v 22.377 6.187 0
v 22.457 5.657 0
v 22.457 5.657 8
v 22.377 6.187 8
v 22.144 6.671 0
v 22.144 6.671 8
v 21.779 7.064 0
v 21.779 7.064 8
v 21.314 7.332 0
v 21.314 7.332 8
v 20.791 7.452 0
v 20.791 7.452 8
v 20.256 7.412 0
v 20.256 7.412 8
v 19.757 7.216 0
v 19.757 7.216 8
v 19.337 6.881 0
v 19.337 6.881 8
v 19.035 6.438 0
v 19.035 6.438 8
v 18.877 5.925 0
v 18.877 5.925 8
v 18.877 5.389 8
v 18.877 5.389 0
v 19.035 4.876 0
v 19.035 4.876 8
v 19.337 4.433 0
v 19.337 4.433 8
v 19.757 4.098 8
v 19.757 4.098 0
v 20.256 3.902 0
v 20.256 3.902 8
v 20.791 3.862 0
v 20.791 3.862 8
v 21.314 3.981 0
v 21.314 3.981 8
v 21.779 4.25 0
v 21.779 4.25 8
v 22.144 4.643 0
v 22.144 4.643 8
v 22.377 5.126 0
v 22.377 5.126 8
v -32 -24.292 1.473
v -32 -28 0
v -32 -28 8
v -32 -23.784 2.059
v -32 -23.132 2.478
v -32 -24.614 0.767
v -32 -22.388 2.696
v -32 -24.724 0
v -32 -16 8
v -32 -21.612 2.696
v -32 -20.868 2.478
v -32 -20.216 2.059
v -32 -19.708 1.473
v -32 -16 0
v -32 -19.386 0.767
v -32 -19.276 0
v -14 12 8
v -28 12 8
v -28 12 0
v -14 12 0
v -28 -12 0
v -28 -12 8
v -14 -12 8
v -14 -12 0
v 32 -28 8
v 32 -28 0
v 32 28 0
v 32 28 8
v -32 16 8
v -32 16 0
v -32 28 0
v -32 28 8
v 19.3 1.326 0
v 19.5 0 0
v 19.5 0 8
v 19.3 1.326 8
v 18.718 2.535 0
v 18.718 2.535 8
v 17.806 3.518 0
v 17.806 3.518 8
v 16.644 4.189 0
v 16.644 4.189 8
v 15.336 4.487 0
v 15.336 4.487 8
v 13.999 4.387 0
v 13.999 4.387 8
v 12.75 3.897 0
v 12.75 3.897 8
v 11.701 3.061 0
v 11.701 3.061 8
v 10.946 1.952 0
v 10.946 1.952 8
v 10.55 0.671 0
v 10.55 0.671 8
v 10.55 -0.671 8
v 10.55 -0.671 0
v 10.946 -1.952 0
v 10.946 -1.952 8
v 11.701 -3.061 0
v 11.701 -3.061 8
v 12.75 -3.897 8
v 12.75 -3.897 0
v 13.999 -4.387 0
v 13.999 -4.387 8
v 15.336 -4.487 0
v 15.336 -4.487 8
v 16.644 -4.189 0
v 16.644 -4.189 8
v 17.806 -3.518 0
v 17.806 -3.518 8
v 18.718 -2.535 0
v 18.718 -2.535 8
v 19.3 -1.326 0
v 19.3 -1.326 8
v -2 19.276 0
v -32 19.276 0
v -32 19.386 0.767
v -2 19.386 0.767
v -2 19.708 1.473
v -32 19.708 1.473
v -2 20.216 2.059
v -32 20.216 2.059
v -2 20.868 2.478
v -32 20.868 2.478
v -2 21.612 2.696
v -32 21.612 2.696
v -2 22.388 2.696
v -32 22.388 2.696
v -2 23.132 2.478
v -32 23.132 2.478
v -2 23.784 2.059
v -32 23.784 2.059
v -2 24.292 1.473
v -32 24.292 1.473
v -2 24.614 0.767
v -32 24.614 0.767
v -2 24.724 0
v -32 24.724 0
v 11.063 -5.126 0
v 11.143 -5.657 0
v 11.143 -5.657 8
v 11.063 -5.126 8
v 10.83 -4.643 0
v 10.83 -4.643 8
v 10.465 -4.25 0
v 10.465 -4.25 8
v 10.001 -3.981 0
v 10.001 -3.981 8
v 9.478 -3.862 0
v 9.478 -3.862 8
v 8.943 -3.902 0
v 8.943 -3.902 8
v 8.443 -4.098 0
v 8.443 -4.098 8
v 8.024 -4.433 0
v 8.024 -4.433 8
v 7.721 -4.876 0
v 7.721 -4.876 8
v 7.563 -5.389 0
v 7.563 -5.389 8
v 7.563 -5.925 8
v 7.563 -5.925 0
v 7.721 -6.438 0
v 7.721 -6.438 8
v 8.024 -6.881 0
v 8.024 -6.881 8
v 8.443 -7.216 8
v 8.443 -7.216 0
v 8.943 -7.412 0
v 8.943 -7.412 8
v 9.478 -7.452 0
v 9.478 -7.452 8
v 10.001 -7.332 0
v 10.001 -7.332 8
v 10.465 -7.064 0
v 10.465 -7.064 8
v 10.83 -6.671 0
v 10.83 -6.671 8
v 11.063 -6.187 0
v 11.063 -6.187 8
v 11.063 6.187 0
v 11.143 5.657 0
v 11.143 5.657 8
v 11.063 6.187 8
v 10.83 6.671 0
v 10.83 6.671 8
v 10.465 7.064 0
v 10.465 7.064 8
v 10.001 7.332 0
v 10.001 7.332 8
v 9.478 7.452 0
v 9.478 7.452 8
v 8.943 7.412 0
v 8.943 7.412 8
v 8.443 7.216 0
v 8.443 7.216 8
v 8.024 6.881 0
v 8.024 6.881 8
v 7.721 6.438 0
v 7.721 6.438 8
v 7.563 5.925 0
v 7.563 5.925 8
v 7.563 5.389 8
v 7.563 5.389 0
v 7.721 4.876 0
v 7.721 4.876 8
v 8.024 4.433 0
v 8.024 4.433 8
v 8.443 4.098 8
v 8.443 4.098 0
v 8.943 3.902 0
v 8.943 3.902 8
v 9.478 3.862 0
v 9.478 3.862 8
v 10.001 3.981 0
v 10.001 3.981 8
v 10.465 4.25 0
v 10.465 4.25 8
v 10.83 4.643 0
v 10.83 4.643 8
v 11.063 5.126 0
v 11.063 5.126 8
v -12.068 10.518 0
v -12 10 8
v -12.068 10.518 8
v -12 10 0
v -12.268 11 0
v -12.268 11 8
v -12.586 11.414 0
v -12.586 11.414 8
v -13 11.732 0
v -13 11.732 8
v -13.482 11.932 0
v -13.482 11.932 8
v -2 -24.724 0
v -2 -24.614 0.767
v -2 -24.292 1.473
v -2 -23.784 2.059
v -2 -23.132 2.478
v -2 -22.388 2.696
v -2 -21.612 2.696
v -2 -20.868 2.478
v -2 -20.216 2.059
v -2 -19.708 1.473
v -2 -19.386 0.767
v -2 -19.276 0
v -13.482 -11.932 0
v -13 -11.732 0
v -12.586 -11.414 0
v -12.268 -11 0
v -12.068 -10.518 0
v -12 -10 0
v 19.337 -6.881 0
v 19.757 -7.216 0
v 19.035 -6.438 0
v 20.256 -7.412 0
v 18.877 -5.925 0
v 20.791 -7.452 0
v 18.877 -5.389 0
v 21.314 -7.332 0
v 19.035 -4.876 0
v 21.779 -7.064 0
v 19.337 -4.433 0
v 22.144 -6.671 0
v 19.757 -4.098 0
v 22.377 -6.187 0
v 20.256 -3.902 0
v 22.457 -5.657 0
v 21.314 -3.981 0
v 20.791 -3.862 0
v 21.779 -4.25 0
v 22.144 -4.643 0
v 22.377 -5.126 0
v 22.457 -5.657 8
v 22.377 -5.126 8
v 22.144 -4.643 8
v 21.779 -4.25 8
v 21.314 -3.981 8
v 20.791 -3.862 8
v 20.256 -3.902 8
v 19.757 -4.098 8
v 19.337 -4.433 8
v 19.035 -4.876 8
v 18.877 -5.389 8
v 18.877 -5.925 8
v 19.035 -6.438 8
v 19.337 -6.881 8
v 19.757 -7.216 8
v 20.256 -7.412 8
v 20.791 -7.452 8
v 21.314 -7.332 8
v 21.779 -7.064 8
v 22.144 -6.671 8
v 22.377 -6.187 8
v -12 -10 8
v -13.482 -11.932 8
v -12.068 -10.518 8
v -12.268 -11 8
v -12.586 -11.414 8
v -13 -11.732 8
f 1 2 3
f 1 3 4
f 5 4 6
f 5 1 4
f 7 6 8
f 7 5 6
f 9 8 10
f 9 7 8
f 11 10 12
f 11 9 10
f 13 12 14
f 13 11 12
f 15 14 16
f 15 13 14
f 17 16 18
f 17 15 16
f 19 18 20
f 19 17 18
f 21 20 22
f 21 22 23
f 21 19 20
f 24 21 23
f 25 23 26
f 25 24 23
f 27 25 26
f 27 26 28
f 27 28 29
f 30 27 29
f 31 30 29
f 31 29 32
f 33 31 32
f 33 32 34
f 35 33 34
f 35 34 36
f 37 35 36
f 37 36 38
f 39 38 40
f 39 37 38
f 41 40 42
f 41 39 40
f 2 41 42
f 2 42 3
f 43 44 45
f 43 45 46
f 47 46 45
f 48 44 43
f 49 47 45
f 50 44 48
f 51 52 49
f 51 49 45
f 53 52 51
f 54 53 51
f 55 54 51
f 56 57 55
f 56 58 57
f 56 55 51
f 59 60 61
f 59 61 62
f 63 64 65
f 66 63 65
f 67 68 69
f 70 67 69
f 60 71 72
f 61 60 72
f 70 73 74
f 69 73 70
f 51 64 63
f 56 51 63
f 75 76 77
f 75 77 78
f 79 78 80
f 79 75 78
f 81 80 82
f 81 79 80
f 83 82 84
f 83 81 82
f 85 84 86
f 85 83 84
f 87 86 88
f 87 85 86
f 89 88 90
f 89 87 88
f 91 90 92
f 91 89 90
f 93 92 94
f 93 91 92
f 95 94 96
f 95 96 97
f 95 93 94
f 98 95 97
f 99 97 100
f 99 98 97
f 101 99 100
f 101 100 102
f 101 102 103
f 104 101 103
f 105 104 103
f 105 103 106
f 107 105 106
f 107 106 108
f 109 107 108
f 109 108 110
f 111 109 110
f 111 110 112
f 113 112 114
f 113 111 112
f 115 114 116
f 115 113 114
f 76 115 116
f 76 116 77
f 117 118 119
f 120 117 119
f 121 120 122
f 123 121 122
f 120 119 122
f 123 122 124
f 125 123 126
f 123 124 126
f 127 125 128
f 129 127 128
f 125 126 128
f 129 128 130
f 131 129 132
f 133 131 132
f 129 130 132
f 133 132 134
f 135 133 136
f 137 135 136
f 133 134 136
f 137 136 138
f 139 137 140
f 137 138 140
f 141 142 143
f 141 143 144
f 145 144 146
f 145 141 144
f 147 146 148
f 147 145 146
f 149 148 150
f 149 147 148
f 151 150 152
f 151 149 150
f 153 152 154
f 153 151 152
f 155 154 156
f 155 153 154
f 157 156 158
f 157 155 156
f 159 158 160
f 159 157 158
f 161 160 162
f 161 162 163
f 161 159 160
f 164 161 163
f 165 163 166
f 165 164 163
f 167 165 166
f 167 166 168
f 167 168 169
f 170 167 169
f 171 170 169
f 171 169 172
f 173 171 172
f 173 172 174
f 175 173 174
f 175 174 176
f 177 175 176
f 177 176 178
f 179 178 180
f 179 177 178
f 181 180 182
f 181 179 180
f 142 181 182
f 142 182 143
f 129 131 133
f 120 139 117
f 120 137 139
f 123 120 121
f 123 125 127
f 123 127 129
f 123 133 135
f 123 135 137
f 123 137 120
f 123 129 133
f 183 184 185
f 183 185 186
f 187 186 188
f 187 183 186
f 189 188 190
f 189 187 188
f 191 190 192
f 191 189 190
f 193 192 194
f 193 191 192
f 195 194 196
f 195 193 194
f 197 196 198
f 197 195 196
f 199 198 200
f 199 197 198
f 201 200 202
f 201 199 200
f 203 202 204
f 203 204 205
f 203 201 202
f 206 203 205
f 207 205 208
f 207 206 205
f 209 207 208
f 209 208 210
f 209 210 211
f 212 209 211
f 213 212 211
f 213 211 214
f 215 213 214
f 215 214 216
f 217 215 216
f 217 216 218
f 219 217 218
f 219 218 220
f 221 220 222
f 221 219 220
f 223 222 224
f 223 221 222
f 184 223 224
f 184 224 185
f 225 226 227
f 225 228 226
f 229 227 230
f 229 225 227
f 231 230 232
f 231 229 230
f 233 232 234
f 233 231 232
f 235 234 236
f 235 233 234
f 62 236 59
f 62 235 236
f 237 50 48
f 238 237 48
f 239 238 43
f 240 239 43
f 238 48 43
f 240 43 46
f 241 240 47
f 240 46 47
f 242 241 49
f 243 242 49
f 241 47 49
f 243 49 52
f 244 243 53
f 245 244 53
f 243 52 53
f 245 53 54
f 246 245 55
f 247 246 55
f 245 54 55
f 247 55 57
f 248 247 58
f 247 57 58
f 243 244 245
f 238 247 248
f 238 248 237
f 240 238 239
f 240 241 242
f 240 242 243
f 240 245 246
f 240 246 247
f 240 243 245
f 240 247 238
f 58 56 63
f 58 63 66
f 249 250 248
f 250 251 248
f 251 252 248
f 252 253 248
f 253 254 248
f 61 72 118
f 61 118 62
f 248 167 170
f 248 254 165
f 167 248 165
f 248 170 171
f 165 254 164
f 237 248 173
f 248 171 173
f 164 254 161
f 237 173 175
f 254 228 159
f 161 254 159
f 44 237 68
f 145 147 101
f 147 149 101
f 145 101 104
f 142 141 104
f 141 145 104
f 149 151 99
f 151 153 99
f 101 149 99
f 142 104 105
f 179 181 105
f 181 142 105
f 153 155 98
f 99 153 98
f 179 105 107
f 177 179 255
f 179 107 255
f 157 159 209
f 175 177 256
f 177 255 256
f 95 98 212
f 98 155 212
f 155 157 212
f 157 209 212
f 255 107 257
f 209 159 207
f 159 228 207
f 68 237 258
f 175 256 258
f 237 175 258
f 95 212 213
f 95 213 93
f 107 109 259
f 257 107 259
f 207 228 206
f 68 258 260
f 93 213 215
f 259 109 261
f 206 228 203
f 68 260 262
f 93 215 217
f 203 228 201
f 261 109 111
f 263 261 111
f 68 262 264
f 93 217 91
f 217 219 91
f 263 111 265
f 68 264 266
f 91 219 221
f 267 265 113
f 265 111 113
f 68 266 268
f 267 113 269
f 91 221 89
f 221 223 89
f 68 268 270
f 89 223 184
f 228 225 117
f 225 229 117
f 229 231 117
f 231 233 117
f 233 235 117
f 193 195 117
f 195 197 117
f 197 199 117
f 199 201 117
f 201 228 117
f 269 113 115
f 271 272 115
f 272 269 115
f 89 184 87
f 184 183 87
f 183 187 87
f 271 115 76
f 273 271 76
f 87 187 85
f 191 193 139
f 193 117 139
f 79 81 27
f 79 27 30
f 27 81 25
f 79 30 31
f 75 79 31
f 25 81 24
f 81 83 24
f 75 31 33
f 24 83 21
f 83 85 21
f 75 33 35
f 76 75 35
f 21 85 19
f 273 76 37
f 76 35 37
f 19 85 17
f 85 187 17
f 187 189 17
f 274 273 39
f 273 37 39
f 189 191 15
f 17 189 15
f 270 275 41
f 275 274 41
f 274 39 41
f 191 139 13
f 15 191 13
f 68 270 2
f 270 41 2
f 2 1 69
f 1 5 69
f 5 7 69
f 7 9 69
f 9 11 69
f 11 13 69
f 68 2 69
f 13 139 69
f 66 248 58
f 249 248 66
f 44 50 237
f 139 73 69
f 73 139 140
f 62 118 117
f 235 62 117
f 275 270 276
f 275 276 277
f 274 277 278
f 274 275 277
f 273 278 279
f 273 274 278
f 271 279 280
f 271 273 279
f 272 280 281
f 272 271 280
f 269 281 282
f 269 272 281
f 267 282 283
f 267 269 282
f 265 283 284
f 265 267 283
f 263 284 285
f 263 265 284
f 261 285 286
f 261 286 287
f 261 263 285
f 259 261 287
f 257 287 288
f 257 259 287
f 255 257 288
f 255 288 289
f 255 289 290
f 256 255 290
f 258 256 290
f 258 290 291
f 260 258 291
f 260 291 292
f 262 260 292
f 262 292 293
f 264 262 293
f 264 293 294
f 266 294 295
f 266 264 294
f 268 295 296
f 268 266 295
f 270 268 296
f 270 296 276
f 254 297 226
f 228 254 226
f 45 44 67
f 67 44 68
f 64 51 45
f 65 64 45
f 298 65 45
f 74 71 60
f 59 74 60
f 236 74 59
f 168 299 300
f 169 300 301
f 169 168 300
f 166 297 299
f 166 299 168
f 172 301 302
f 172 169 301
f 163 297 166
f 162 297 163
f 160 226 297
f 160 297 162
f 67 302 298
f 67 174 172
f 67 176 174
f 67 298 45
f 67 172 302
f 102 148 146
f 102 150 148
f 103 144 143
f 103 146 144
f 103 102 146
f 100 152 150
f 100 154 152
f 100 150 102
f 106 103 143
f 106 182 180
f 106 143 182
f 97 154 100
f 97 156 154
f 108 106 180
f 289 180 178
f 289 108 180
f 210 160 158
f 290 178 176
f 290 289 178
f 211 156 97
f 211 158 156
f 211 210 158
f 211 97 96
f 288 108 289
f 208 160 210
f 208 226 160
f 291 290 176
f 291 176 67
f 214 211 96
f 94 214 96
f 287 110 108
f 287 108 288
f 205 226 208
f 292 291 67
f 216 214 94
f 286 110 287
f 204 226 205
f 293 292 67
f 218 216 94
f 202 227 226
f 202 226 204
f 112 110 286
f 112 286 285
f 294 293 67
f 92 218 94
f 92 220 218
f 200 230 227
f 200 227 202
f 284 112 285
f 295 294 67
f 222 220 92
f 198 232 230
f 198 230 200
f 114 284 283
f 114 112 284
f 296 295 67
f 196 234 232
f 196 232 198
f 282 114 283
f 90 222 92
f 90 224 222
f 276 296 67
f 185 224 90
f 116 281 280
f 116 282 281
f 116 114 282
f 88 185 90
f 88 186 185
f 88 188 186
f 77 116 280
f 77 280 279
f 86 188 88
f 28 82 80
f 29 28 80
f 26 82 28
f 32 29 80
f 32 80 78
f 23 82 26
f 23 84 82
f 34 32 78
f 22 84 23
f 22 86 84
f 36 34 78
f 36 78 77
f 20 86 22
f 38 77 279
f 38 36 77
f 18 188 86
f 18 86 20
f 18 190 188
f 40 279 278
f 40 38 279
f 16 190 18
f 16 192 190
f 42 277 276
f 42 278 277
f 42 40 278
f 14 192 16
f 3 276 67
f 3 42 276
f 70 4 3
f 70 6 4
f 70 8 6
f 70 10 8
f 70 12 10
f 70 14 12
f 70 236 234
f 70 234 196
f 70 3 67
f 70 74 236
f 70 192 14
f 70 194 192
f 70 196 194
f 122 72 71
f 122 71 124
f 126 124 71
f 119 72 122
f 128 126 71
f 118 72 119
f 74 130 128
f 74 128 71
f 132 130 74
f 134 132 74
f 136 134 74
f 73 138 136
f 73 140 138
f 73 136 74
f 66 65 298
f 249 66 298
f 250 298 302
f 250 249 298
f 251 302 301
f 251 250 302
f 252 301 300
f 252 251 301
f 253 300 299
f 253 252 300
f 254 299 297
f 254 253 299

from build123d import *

# Parameters (mm, degrees)
F0_W     = 64
F0_H     = 56
F0_R     = 1.8
F0_R_2   = 4.5
F1_DEPTH = 8
F3_DEPTH = 30
F4_W     = 20
F4_H     = 24
F5_DEPTH = 25
F6_SIZE  = 4
F7_R     = 2


with BuildPart() as f1:
    # F0 (on Top) → F1 (new body)
    with BuildSketch(Plane.XY):
        Rectangle(F0_W, F0_H)
        with Locations((9.3431457505, -5.6568542495)):
            Circle(F0_R, mode=Mode.SUBTRACT)
        with Locations((20.6568542495, -5.6568542495)):
            Circle(F0_R, mode=Mode.SUBTRACT)
        with Locations((15, 0)):
            Circle(F0_R_2, mode=Mode.SUBTRACT)
        with Locations((9.3431457505, 5.6568542495)):
            Circle(F0_R, mode=Mode.SUBTRACT)
        with Locations((20.6568542495, 5.6568542495)):
            Circle(F0_R, mode=Mode.SUBTRACT)
    extrude(amount=F1_DEPTH)

    # F2 (on face) → F3 (cut)
    with BuildSketch(Plane(origin=(-32, 0, 0), x_dir=(0, -1, 0), z_dir=(-1, 0, 0))):
        with BuildLine():
            Line((-24.7241525946, 0), (-19.2758474054, 0))
            ThreePointArc((-19.2758474054, 0), (-22, 2.7241525946), (-24.7241525946, 0))
        make_face()
        with BuildLine():
            ThreePointArc((24.7241525946, 0), (22, 2.7241525946), (19.2758474054, 0))
            Line((19.2758474054, 0), (24.7241525946, 0))
        make_face()
    extrude(amount=-F3_DEPTH, mode=Mode.SUBTRACT)

    # F4 (on face) → F5 (cut)
    with BuildSketch(Plane.XY.offset(8)):
        with Locations((-22, 0)):
            Rectangle(F4_W, F4_H)
    extrude(amount=-F5_DEPTH, mode=Mode.SUBTRACT)

    # F6
    f6_edges = [f1.edges().sort_by_distance(p)[0] for p in [
        (-32, 12, 4),
        (-32, -12, 4),
    ]]
    chamfer(f6_edges, length=F6_SIZE)

    # F7
    f7_edges = [f1.edges().sort_by_distance(p)[0] for p in [
        (-12, 12, 4),
        (-12, -12, 4),
    ]]
    fillet(f7_edges, radius=F7_R)


solid = f1.part
